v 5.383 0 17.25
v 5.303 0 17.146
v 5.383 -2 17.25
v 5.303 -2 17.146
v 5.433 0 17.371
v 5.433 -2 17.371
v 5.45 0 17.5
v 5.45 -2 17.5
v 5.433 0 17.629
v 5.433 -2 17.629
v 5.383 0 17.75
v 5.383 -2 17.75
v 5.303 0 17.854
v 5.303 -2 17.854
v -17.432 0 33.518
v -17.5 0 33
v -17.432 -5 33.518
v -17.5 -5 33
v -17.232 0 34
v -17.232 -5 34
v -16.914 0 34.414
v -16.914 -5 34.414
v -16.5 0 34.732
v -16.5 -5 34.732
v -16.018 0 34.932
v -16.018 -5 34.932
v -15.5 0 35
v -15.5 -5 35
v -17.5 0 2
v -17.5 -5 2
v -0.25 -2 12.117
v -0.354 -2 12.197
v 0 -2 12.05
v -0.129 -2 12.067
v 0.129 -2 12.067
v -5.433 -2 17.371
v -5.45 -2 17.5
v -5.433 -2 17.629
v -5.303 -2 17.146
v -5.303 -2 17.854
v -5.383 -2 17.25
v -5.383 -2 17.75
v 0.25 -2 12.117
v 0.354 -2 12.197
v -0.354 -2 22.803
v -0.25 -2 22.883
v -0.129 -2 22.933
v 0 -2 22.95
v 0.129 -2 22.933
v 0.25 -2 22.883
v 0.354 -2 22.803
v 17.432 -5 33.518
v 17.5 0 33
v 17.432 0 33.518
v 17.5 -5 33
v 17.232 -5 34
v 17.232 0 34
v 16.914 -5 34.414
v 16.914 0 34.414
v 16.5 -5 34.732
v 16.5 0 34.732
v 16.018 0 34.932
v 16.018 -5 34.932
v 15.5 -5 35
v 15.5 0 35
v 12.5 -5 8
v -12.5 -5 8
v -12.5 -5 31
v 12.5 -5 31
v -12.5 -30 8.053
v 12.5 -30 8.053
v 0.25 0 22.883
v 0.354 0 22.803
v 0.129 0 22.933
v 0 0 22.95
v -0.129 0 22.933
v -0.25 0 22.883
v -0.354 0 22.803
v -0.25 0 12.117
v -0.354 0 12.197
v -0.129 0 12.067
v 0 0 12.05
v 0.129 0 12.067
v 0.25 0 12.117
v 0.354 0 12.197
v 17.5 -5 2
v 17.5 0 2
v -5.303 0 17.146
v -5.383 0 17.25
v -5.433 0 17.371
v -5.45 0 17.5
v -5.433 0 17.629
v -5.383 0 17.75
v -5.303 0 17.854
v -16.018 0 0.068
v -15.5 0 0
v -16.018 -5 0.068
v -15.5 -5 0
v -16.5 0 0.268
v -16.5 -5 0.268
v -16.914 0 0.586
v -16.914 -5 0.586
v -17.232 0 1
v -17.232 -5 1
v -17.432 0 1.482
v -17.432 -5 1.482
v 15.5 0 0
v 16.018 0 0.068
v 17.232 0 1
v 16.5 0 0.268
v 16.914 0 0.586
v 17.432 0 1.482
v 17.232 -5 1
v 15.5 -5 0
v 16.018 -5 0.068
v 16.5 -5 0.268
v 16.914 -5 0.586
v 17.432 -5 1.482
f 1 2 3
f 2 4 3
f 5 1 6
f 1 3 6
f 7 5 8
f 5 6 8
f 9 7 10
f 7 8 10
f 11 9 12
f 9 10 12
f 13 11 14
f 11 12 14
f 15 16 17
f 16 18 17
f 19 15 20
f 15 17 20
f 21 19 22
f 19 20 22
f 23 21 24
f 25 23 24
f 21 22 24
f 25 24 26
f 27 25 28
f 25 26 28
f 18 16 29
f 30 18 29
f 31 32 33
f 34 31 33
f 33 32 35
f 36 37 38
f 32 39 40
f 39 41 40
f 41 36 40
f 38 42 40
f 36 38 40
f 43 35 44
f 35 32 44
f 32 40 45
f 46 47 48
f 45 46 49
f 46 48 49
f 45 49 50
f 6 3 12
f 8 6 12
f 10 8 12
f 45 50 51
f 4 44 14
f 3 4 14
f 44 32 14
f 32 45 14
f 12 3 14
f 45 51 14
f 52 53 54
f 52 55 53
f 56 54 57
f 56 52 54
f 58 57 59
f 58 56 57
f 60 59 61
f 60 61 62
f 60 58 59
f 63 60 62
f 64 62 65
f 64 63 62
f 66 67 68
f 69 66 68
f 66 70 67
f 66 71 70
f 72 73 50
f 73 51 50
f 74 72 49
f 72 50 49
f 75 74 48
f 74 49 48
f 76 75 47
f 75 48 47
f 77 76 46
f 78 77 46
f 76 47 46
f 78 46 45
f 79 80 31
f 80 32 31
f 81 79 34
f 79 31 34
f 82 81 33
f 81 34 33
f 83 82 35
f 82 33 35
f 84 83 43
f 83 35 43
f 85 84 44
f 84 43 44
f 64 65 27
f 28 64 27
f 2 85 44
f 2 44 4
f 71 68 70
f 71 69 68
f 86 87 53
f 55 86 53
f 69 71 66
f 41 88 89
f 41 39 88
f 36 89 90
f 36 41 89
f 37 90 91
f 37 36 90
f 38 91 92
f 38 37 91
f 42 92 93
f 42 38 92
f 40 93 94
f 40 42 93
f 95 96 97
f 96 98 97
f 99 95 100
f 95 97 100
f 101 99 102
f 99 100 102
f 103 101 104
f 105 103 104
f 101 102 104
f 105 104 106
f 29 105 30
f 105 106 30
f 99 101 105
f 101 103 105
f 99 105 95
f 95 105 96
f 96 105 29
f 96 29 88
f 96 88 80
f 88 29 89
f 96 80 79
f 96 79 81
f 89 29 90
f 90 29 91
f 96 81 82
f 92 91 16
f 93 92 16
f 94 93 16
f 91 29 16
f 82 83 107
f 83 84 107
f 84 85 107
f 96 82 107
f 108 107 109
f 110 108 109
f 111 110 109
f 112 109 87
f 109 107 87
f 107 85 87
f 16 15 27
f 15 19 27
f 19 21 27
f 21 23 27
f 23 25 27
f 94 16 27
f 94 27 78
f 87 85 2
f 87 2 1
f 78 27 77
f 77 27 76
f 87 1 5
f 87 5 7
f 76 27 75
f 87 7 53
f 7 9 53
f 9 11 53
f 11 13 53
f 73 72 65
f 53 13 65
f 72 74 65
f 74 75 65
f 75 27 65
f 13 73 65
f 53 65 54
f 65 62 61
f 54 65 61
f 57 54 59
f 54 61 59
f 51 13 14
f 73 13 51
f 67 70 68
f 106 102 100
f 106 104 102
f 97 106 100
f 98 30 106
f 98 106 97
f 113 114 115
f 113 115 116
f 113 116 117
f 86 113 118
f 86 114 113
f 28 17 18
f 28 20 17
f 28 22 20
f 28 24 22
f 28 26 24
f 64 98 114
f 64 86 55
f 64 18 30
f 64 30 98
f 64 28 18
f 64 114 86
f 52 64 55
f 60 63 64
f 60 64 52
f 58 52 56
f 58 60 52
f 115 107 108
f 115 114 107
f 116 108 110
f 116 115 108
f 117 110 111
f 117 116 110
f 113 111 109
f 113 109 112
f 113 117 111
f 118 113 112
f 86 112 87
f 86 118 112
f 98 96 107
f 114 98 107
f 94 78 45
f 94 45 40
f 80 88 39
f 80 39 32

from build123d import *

# Parameters (mm, degrees)
F1_DEPTH = 5
F2_DEPTH = 2
F3_R     = 2
F4_R     = 0.5
F6_DEPTH = 12.5


with BuildPart() as f1:
    # F0 (on Front) → F1 (new body)
    with BuildSketch(Plane.XZ):
        with BuildLine():
            ThreePointArc((17.5, 3), (0, 4), (-17.5, 3))
            Line((-17.5, 3), (-17.5, 0))
            Line((-17.5, 0), (17.5, 0))
            Line((17.5, 0), (17.5, 3))
        make_face()
        with BuildLine():
            Line((17.5, 35), (-17.5, 35))
            Line((-17.5, 35), (-17.5, 3))
            ThreePointArc((-17.5, 3), (0, 4), (17.5, 3))
            Line((17.5, 3), (17.5, 35))
        make_face()
        Polygon((5.656854, 17.5), (0, 11.843146), (-5.656854, 17.5), (0, 23.156854), align=None, mode=Mode.SUBTRACT)
        Polygon((-5.656854, 17.5), (0, 11.843146), (5.656854, 17.5), (0, 23.156854), align=None)
    extrude(amount=F1_DEPTH)

    # F0 (on Front) → F2 (cut)
    with BuildSketch(Plane.XZ):
        Polygon((-5.656854, 17.5), (0, 11.843146), (5.656854, 17.5), (0, 23.156854), align=None)
    extrude(amount=F2_DEPTH, mode=Mode.SUBTRACT)

    # F3
    f3_edges = [f1.edges().sort_by_distance(p)[0] for p in [
        (-17.5, -2.5, 35),
        (17.5, -2.5, 35),
        (-17.5, -2.5, 0),
        (17.5, -2.5, 0),
    ]]
    fillet(f3_edges, radius=F3_R)

    # F4
    f4_edges = [f1.edges().sort_by_distance(p)[0] for p in [
        (5.656854, -1, 17.5),
        (0, -1, 23.156854),
        (-5.656854, -1, 17.5),
        (0, -1, 11.843146),
    ]]
    fillet(f4_edges, radius=F4_R)


with BuildPart() as f6:
    # F5 (on Right) → F6 (new body, symmetric)
    with BuildSketch(Plane.YZ):
        Polygon((-30, 8.053076), (-5, 8), (-5, 31), align=None)
    extrude(amount=F6_DEPTH, both=True)


solid = Compound([f1.part, f6.part])
